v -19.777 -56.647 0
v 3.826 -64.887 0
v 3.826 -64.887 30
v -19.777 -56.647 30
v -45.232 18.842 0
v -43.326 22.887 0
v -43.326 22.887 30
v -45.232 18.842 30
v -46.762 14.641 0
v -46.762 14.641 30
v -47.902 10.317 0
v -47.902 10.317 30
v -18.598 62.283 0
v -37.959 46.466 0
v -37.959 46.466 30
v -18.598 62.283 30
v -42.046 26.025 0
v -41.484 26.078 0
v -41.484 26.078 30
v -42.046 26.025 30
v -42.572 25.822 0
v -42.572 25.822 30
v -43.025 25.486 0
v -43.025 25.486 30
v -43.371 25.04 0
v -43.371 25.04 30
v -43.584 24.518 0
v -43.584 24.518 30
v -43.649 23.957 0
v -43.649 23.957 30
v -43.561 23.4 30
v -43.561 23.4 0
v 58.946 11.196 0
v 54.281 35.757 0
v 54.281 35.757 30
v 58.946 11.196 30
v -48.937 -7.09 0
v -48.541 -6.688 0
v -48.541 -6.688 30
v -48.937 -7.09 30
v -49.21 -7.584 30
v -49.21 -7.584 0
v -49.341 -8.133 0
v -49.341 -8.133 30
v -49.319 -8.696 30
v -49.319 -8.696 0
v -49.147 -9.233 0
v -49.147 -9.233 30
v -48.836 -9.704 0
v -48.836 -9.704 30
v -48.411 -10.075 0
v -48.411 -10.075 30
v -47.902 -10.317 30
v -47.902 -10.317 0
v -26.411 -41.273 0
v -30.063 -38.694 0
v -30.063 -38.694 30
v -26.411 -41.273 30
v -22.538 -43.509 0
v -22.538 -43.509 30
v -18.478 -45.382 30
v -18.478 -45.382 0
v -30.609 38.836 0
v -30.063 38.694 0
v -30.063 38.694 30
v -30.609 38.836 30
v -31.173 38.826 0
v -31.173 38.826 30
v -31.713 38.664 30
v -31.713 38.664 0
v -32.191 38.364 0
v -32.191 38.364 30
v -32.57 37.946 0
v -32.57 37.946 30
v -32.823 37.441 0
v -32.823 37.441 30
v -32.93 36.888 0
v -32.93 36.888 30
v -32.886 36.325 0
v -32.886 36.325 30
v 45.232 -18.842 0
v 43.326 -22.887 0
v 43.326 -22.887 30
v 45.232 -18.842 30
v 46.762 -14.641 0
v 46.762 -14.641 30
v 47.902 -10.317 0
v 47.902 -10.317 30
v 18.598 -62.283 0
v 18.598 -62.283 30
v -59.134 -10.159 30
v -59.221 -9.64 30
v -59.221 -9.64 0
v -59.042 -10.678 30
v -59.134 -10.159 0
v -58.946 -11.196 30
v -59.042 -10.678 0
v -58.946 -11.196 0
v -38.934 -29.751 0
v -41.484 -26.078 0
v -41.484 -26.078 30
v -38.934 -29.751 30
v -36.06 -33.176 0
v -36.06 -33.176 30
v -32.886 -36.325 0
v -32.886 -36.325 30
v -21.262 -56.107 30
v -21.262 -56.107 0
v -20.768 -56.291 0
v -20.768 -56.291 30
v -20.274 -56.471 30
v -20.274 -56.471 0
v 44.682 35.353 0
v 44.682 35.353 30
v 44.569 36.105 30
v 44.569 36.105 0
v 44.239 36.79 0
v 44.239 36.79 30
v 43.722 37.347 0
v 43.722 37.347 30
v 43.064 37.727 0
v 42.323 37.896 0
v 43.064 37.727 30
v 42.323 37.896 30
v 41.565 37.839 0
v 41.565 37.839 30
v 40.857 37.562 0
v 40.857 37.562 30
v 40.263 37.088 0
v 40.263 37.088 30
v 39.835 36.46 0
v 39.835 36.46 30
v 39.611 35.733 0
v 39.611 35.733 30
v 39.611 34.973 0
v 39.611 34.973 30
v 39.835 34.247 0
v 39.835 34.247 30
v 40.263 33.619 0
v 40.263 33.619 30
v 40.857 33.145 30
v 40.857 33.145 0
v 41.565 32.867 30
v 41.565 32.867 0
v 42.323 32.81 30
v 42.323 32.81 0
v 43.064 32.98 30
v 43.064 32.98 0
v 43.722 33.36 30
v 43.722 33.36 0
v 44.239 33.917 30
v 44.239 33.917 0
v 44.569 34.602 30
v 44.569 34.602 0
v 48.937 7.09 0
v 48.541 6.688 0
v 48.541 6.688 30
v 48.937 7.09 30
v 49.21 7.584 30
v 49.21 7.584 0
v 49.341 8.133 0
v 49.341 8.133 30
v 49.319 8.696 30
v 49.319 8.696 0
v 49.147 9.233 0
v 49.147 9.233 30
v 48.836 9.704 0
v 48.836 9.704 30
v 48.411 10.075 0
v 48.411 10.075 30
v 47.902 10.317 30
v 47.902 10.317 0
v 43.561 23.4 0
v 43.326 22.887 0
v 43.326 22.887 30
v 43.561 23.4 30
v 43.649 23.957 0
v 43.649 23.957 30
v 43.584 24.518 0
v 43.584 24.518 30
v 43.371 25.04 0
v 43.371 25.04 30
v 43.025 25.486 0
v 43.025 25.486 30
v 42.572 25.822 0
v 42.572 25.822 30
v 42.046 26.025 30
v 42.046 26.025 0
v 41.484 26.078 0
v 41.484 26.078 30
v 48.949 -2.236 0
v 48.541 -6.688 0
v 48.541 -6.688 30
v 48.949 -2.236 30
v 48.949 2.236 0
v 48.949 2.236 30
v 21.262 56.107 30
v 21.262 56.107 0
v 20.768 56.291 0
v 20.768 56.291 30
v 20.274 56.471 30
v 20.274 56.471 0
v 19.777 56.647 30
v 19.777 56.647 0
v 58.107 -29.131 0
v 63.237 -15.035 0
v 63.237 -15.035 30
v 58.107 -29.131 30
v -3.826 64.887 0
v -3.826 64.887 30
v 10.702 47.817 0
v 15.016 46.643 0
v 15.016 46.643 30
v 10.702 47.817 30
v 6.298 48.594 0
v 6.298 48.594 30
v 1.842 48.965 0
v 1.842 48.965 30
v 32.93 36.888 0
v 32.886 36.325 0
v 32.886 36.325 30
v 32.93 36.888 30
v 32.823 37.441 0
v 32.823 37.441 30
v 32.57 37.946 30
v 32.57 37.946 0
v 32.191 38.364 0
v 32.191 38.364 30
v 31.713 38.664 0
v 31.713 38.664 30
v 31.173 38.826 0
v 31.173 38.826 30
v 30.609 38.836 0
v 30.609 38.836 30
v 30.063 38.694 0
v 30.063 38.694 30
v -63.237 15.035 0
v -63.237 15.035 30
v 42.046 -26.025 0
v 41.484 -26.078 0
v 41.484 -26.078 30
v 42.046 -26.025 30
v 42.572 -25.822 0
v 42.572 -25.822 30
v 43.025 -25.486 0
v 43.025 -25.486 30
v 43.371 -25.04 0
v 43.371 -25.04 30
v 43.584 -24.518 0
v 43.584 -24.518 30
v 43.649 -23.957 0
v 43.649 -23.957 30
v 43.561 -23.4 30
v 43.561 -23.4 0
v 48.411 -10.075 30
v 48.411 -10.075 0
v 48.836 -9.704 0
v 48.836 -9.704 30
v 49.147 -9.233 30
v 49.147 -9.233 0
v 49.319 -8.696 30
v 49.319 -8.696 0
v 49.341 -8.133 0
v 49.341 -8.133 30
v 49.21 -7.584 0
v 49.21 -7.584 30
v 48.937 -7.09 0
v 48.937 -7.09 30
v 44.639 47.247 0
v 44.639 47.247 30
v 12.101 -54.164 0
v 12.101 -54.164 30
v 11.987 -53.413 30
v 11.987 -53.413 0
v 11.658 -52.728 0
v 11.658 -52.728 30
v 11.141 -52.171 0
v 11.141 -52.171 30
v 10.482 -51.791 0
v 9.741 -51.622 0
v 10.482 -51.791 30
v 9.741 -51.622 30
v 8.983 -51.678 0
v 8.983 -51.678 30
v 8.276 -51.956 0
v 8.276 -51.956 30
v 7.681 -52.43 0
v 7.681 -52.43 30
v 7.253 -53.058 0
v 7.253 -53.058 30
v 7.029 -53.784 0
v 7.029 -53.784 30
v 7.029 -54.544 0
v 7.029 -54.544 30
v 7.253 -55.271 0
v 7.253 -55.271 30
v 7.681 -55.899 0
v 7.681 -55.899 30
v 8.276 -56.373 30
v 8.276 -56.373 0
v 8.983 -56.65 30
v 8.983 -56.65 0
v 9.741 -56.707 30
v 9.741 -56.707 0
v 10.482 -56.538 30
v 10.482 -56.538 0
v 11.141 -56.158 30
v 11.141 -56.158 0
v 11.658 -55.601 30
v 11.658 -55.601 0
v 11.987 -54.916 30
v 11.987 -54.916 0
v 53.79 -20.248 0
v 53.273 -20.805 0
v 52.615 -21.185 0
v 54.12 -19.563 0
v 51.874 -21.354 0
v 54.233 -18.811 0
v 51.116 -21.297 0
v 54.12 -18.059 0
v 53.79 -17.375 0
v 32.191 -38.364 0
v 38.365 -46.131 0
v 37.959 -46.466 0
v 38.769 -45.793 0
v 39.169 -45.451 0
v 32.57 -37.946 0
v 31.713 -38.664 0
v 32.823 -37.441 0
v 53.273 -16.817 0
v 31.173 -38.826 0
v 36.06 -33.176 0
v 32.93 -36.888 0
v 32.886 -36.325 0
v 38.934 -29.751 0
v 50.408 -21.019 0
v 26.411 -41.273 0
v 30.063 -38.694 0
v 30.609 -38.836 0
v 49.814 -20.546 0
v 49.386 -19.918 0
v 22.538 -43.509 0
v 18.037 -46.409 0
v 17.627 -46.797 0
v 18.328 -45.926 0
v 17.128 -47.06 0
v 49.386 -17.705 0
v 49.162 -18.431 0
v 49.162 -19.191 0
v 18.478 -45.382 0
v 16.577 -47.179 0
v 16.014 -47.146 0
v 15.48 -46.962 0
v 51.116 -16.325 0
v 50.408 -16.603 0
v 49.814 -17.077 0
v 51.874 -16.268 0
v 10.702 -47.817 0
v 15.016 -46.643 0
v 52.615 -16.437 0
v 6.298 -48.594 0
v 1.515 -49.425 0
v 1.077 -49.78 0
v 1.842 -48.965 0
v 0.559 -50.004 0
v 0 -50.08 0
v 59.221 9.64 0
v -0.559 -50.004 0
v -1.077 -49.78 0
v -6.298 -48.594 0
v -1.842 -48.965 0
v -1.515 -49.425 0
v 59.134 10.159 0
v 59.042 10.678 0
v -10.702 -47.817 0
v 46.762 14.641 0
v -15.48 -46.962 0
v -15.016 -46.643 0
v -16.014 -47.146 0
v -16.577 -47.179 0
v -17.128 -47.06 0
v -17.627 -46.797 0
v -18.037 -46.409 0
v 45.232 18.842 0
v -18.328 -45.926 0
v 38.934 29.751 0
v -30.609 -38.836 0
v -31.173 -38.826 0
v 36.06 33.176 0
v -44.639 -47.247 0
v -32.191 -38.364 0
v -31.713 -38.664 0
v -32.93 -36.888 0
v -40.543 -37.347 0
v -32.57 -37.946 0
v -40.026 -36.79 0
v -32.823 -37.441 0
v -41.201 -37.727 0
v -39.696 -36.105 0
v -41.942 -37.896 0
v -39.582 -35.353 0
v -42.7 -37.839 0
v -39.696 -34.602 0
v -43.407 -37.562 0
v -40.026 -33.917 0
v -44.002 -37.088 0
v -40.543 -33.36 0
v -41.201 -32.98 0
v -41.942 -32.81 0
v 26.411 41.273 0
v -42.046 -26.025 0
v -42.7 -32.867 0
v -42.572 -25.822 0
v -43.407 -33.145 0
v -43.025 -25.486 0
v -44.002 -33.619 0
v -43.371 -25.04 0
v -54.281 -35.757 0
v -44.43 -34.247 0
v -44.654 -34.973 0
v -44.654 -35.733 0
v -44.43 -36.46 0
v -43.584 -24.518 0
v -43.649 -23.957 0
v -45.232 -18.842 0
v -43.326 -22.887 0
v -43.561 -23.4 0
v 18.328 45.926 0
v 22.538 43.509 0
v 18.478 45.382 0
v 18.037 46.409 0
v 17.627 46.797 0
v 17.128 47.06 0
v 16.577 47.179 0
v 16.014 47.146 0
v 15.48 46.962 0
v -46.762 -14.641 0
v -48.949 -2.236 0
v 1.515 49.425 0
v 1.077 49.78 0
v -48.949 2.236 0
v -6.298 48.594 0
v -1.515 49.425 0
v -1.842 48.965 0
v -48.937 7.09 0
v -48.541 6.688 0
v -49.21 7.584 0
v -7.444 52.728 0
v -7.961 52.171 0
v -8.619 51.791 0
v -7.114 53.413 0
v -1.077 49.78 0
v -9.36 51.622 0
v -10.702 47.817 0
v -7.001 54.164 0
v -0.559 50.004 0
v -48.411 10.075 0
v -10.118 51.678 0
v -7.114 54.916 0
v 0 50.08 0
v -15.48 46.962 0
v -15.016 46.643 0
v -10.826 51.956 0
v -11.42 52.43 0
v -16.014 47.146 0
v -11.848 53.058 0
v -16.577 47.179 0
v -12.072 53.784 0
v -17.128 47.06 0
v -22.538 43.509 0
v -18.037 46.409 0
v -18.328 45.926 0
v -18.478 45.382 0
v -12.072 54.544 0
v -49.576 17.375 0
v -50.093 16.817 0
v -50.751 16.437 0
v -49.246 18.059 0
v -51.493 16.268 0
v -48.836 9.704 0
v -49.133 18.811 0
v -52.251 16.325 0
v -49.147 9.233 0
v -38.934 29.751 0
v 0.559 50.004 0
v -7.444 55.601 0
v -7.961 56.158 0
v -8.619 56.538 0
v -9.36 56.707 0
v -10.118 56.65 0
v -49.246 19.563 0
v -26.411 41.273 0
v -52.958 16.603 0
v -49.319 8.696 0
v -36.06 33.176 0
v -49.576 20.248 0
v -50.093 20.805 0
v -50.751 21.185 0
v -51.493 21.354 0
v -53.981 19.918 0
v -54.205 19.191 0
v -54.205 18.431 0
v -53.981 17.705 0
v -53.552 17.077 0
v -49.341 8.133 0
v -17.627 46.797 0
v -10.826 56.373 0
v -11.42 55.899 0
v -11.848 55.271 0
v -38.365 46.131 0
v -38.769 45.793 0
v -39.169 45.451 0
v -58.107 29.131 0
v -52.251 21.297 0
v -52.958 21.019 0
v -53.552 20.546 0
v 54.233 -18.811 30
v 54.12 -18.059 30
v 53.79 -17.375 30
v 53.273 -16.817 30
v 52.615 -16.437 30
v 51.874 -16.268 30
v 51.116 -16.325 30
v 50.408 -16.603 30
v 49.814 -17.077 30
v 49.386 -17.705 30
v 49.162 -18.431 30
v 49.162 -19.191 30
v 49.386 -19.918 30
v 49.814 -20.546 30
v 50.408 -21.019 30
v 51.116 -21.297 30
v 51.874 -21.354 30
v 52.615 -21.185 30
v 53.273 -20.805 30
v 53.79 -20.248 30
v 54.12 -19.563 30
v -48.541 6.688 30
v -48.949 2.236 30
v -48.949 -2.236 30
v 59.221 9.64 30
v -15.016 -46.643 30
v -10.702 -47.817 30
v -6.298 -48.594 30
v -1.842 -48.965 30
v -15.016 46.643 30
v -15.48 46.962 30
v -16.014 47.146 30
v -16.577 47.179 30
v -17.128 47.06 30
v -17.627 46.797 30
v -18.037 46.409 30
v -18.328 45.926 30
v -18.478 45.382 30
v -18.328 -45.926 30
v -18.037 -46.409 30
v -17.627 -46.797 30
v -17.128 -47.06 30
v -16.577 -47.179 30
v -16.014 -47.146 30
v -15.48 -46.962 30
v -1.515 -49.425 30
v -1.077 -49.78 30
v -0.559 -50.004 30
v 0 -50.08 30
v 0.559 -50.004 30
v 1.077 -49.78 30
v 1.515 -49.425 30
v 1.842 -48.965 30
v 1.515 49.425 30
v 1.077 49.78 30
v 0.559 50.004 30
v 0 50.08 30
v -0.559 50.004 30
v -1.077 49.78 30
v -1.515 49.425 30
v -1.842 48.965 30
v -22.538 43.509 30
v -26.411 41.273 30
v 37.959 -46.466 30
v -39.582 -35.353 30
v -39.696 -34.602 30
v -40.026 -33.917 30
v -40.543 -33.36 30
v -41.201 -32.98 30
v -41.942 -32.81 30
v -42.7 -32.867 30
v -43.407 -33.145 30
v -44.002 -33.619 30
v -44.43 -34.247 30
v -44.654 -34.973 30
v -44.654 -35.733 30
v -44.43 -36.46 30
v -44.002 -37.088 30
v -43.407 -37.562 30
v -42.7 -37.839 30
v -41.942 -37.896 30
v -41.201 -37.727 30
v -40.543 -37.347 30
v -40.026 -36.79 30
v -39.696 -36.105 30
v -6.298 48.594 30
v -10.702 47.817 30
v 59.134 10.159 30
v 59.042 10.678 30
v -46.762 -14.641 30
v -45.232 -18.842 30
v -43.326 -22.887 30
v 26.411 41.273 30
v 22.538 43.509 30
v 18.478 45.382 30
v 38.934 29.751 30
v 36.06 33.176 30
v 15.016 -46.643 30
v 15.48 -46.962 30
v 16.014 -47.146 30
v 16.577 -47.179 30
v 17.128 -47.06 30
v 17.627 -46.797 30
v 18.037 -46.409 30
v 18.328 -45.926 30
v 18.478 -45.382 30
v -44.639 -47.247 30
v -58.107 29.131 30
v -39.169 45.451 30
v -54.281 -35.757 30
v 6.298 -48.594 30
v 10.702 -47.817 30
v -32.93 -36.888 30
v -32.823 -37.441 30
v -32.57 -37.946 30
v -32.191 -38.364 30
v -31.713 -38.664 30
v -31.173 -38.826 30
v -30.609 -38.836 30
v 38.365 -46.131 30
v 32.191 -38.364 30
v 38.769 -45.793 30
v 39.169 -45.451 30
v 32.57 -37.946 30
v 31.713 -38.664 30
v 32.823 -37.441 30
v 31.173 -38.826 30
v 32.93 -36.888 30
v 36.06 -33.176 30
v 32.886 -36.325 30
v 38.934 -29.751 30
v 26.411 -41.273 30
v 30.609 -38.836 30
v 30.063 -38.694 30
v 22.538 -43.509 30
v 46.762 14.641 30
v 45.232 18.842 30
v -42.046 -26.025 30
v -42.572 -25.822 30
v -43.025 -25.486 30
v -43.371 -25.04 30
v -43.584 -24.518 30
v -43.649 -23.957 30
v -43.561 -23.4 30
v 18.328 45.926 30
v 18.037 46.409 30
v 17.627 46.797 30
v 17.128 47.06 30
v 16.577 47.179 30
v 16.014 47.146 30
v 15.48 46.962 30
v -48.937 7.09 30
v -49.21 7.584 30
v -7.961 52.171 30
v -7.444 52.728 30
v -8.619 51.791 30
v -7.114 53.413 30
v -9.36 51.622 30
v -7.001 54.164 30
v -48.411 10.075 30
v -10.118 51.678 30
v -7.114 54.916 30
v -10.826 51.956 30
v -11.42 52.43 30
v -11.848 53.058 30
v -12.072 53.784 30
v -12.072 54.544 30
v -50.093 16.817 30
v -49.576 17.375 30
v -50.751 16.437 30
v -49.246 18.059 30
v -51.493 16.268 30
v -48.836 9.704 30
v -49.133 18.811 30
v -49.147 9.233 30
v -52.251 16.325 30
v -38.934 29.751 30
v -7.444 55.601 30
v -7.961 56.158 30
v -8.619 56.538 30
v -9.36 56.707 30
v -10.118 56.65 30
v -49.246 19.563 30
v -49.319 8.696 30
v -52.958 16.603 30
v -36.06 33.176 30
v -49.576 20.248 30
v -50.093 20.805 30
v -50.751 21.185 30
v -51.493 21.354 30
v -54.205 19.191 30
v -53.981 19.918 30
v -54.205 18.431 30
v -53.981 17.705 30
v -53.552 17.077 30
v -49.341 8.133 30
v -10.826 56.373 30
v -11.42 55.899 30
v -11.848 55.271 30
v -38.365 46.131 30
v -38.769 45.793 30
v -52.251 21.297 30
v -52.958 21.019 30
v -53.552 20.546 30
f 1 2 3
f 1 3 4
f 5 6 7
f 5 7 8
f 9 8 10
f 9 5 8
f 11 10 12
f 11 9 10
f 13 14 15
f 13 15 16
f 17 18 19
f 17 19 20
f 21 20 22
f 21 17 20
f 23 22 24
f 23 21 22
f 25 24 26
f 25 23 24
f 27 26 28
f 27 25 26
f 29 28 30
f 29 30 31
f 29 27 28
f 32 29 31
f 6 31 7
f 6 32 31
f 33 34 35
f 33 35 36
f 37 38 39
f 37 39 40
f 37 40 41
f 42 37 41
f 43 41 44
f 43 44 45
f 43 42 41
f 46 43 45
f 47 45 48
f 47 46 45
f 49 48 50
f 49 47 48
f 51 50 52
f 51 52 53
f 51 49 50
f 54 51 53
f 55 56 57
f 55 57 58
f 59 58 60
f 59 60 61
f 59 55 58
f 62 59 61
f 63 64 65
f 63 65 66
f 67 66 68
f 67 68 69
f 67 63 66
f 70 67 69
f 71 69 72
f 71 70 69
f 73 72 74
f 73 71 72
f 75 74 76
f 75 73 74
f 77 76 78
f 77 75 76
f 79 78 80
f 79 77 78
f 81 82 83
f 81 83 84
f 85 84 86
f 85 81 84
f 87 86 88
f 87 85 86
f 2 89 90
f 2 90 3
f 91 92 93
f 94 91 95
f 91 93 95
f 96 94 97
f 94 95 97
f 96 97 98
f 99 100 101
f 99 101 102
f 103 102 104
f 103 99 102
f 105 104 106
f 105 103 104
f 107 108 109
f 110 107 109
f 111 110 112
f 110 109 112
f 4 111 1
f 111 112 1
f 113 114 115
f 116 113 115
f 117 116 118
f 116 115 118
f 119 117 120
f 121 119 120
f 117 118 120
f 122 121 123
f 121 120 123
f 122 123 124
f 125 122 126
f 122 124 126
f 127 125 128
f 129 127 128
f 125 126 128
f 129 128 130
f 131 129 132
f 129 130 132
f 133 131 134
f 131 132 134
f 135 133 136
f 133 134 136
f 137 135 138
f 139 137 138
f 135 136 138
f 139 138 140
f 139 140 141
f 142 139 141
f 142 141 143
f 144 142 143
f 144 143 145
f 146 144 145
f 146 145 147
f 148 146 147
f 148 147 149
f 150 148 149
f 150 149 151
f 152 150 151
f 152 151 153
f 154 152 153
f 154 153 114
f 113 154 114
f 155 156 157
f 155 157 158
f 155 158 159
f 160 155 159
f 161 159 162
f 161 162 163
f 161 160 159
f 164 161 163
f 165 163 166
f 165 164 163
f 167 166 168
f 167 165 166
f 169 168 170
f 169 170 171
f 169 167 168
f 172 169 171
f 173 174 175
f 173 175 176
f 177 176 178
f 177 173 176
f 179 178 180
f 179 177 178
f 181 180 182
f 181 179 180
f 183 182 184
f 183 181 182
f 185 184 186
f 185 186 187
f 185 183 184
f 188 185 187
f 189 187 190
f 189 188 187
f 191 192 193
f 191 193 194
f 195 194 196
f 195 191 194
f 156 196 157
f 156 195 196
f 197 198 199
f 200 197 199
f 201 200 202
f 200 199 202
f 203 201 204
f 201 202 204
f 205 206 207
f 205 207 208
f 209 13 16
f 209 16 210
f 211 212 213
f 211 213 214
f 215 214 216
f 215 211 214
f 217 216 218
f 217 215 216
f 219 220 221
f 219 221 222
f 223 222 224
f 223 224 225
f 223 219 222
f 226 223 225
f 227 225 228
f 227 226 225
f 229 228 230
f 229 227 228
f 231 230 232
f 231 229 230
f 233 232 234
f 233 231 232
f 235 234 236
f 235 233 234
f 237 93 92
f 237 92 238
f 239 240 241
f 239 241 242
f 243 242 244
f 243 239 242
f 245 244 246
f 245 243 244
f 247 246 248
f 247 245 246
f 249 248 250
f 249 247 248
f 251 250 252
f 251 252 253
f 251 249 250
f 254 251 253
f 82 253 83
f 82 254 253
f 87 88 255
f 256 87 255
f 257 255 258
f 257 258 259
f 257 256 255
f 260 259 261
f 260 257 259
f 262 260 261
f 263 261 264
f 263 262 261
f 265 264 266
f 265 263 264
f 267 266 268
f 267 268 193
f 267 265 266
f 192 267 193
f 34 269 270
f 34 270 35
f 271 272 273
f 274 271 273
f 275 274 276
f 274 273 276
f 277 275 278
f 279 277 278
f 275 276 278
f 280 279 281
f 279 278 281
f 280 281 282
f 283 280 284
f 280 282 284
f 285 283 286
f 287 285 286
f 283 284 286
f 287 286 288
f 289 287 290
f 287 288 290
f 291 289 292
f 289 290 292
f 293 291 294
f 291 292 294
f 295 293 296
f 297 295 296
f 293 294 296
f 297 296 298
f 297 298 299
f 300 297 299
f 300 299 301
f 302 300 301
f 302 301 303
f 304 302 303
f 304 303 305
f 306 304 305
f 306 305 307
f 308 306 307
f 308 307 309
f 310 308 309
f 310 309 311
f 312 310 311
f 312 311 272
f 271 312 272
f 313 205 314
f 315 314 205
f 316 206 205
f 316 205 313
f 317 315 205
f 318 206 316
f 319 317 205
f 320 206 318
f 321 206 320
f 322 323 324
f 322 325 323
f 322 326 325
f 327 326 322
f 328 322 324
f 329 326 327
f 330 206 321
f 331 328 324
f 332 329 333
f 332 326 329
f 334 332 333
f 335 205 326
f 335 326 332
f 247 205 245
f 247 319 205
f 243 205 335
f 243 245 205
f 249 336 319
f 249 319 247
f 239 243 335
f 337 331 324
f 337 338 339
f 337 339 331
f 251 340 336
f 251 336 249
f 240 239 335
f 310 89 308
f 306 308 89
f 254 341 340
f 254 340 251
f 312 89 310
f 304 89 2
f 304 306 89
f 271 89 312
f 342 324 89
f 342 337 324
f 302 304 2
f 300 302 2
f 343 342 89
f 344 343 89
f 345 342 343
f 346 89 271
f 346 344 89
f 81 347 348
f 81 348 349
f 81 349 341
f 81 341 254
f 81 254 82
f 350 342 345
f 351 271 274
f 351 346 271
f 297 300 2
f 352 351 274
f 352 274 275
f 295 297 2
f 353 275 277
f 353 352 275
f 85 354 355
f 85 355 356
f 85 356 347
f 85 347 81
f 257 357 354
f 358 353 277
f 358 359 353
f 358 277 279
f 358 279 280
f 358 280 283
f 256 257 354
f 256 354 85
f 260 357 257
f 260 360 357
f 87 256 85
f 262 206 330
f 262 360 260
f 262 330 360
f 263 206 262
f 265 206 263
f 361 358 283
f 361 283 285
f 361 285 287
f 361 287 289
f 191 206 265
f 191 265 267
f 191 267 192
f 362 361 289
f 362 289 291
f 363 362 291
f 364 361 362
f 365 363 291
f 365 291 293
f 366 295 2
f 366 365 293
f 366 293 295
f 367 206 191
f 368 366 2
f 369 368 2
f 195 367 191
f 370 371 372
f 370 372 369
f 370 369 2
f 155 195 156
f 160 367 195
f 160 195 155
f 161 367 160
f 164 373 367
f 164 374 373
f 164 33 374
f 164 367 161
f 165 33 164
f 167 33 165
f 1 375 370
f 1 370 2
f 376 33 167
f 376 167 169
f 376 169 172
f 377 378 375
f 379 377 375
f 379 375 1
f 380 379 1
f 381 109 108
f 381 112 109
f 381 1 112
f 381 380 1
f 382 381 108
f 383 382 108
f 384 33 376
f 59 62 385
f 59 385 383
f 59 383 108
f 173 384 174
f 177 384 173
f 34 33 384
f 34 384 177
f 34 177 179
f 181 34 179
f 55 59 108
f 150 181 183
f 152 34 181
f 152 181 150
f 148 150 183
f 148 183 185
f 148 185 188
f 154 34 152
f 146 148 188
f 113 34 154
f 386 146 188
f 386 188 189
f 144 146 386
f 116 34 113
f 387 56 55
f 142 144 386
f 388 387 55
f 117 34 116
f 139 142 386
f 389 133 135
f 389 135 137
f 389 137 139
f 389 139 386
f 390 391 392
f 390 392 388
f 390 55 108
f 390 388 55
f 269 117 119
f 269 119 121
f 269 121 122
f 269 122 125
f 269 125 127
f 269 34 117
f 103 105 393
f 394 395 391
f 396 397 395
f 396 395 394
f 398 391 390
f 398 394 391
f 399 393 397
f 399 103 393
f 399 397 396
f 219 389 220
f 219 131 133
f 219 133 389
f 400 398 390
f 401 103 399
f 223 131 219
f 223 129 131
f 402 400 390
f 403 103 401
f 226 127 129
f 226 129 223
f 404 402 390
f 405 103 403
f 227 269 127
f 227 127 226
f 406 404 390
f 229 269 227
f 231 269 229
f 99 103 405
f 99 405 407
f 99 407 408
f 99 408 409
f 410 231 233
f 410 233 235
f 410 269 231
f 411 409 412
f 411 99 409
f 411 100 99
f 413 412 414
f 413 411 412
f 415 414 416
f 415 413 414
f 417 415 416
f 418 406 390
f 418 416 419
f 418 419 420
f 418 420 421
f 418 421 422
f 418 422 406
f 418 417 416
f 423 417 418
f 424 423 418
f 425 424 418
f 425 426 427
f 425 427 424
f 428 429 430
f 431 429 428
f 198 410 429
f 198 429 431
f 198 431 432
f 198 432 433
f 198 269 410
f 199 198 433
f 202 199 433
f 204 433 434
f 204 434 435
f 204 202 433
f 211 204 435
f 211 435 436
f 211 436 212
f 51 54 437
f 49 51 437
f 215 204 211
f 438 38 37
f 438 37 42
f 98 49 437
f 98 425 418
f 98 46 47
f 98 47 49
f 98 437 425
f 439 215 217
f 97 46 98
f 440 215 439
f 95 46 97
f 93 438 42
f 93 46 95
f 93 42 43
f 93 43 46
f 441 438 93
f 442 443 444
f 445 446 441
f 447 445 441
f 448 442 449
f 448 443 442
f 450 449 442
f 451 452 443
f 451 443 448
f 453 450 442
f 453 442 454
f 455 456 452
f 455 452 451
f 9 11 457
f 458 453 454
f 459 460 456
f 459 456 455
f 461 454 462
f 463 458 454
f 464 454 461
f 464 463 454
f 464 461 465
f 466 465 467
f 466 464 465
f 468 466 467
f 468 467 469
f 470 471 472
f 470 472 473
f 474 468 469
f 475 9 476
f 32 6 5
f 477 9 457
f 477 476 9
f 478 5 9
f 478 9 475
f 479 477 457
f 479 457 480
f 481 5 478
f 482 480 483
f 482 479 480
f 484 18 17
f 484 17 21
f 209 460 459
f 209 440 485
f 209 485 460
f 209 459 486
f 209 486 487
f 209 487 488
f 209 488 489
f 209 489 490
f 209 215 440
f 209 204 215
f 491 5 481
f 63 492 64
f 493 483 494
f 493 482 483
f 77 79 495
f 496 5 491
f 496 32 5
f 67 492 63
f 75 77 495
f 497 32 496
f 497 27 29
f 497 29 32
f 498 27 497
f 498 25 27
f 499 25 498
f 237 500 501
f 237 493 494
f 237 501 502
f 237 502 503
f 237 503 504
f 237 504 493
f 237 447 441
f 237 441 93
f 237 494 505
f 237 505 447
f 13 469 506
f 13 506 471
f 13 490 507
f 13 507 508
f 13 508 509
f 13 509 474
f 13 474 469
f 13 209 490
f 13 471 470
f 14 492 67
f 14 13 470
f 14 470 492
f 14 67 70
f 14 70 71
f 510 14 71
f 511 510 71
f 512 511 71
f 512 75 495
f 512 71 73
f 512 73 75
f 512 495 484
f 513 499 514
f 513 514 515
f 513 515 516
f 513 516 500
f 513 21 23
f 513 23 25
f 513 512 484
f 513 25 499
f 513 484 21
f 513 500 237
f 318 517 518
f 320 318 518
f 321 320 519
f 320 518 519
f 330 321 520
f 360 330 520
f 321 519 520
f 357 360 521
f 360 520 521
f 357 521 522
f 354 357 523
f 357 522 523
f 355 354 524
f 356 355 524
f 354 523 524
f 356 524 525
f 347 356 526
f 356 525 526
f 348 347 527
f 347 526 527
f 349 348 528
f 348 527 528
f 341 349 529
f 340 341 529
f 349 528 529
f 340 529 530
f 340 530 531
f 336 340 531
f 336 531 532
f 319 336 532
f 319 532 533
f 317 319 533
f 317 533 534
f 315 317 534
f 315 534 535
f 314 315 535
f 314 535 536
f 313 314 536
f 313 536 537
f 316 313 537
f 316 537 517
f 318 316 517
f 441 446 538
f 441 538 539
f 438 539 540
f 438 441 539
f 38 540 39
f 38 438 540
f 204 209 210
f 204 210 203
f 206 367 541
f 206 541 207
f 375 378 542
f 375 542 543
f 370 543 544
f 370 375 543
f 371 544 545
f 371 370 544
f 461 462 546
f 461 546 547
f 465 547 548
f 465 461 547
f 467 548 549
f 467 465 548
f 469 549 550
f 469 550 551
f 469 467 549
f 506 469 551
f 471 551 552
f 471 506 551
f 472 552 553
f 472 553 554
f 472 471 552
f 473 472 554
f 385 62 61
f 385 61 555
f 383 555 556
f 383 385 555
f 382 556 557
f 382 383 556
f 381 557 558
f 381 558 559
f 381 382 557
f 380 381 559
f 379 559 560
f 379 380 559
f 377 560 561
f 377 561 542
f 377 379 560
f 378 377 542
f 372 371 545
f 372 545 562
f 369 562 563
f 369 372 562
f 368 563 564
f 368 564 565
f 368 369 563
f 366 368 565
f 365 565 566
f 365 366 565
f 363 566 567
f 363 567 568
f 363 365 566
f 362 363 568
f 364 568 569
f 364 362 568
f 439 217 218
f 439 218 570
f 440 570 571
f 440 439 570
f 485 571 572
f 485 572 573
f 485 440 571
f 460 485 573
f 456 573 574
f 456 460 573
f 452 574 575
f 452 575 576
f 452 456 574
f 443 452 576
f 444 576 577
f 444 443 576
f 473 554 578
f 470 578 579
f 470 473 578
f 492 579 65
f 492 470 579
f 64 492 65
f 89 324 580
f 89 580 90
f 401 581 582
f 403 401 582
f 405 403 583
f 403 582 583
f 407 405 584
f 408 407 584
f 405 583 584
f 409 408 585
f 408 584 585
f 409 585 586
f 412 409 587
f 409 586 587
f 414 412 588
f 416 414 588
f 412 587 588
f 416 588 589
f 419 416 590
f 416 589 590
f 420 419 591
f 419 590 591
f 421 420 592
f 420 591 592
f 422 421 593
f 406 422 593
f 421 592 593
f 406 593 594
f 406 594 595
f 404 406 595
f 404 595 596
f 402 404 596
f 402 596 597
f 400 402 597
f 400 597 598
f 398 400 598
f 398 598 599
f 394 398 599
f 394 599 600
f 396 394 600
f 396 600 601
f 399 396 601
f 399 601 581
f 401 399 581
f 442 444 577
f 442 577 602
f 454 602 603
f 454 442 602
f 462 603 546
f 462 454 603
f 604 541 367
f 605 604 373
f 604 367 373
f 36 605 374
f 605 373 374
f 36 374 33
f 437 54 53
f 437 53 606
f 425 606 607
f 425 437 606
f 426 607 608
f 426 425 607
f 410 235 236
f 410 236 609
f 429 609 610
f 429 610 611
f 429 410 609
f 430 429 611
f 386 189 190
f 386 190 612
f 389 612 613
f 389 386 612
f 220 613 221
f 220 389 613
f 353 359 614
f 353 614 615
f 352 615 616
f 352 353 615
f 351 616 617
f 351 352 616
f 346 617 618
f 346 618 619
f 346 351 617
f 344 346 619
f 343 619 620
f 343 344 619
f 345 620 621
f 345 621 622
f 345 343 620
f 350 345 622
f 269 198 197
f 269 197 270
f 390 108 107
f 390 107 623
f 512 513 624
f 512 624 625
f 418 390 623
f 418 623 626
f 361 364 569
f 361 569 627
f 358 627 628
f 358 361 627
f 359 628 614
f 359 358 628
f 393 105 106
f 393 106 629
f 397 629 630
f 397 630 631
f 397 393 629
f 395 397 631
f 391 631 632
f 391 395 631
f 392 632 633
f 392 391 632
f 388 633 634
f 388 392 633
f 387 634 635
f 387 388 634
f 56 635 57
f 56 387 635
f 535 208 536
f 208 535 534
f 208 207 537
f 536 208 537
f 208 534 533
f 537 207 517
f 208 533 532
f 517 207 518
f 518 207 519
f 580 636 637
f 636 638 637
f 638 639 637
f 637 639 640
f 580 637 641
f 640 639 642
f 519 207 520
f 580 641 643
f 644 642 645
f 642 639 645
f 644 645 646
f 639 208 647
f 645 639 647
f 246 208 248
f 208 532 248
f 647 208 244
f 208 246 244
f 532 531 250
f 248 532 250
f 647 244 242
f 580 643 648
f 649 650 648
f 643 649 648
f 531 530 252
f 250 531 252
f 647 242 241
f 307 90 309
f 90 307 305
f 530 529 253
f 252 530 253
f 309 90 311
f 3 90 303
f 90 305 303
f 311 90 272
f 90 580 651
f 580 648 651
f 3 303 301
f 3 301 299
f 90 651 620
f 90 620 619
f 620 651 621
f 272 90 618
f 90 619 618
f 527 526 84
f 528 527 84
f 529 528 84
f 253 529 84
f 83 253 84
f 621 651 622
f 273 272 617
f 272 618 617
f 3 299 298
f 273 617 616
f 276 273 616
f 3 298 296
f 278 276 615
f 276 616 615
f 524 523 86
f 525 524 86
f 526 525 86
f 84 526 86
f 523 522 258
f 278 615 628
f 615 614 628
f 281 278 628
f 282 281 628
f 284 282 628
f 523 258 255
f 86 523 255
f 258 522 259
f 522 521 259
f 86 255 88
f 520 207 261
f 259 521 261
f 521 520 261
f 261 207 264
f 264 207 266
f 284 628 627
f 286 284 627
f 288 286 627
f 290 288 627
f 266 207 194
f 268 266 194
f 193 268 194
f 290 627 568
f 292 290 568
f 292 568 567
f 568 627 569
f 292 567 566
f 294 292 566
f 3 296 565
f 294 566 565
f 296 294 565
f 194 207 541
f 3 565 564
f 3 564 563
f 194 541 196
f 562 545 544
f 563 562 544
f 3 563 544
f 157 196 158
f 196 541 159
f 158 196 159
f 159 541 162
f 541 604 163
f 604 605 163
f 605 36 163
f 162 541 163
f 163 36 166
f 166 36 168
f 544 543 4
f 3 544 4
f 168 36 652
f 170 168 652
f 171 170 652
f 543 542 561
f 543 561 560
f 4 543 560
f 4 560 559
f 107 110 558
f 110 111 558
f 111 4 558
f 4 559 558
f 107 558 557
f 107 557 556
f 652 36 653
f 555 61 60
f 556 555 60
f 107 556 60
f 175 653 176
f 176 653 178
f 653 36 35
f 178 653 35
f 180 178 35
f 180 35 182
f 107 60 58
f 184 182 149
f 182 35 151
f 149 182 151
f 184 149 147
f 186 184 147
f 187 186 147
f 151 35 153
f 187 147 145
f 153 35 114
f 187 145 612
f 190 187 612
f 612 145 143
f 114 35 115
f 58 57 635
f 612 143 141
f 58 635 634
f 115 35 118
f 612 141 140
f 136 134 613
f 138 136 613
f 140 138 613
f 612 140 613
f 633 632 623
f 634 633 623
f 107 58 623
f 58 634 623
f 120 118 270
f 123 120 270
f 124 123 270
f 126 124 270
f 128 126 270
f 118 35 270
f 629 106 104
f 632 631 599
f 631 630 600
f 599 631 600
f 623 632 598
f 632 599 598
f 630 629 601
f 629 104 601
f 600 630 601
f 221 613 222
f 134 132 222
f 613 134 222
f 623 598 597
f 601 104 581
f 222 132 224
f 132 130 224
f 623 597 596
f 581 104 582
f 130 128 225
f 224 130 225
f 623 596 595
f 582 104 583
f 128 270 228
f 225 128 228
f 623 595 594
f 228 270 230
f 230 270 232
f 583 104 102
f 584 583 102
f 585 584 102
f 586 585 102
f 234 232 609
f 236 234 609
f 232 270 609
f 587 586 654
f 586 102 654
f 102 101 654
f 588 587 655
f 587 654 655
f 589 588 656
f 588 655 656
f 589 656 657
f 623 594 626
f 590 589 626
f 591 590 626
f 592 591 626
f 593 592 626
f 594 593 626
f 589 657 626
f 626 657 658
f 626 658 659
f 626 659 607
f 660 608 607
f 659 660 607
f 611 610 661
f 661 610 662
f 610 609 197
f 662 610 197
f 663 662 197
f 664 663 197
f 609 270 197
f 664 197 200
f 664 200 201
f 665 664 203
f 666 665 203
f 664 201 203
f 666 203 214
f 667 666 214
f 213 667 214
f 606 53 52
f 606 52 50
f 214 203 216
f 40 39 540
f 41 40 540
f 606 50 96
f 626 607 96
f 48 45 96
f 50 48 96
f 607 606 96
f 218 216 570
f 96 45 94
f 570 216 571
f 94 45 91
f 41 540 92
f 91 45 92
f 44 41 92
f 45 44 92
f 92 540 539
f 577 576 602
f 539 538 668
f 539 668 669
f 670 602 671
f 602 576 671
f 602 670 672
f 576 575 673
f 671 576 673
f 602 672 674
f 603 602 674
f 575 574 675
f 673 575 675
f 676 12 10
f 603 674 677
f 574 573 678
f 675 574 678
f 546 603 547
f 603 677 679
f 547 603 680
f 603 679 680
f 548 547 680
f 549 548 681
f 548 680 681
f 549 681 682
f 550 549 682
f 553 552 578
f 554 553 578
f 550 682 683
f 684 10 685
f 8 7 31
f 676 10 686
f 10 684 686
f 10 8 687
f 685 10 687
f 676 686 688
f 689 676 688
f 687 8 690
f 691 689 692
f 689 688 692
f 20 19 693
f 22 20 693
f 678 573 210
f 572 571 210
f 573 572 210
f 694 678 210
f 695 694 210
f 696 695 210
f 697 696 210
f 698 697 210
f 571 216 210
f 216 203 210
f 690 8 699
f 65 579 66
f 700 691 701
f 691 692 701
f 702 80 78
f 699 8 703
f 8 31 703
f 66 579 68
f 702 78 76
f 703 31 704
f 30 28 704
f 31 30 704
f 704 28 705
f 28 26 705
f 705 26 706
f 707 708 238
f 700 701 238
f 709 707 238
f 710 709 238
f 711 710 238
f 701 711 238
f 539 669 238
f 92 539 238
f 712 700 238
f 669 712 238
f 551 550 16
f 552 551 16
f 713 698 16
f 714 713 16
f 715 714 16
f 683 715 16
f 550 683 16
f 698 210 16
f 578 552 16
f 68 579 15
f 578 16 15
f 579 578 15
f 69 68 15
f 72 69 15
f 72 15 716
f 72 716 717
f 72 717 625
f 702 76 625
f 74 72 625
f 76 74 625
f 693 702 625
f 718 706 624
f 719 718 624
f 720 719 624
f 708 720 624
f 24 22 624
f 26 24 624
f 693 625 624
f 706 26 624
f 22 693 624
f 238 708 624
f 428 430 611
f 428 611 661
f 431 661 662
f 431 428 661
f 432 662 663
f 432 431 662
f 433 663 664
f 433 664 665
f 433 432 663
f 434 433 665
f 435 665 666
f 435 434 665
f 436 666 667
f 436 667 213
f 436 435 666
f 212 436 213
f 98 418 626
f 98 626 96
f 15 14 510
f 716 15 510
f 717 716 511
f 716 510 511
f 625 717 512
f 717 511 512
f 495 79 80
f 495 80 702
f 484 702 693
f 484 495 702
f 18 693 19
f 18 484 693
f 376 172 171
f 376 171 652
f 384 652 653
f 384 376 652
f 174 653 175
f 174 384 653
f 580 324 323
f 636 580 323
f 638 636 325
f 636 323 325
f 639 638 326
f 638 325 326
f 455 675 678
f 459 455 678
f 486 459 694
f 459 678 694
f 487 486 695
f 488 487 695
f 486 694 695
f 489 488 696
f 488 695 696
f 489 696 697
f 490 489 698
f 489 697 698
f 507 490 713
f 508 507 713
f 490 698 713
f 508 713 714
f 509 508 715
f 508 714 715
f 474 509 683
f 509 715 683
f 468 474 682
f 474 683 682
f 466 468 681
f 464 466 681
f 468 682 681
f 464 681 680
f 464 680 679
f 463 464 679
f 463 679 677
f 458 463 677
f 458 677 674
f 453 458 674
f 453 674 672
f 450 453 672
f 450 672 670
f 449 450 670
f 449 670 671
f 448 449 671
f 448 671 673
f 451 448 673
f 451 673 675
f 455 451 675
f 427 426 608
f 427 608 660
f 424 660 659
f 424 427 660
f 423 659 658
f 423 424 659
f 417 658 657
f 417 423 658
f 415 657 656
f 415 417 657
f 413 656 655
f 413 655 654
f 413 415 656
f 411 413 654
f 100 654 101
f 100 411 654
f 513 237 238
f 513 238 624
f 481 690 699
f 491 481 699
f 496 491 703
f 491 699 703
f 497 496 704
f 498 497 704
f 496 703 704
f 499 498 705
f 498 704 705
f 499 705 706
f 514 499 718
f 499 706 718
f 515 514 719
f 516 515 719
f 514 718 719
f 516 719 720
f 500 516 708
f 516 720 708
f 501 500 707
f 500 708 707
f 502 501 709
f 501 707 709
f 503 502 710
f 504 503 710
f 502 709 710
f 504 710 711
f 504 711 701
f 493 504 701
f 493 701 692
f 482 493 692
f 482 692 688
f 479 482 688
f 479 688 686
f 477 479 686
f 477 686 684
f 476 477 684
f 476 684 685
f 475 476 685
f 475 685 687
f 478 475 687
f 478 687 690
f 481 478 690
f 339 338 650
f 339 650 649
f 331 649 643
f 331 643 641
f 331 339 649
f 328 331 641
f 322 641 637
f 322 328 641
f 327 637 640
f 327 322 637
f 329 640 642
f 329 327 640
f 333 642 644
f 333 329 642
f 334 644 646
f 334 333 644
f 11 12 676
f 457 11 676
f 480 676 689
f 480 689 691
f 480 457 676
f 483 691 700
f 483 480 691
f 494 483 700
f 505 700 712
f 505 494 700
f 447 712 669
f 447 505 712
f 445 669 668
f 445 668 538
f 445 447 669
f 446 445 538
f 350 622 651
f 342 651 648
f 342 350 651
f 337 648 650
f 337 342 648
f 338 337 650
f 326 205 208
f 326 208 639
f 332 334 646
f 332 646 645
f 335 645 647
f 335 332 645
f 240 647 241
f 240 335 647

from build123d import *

# Parameters (mm, degrees)
SKETCH1_R           = 60
BOSS_EXTRUDE1_DEPTH = 30
SKETCH2_R           = 2.55
CUT_EXTRUDE2_DEPTH  = 91
BOSS_EXTRUDE2_START = -30
BOSS_EXTRUDE2_DEPTH = 30


with BuildPart() as part:
    # Sketch1 → Boss-Extrude1 (new body)
    with BuildSketch(Plane.XY):
        Circle(SKETCH1_R)
        with BuildLine():
            ThreePointArc((-15.015830627, 46.642521701), (-17.128368778, 47.059806449), (-18.478441423, 45.382234438))
            ThreePointArc((-18.478441423, 45.382234438), (-24.5, 42.435244785), (-30.062947192, 38.693916914))
            ThreePointArc((-30.062947192, 38.693916914), (-32.190803493, 38.363505711), (-32.885693376, 36.325351632))
            ThreePointArc((-32.885693376, 36.325351632), (-37.536177713, 31.496592875), (-41.484028644, 26.078254686))
            ThreePointArc((-41.484028644, 26.078254686), (-43.370552222, 25.04), (-43.326445366, 22.887095314))
            ThreePointArc((-43.326445366, 22.887095314), (-46.044938419, 16.758987023), (-47.901524003, 10.317170068))
            ThreePointArc((-47.901524003, 10.317170068), (-49.319172271, 8.696300738), (-48.541388615, 6.688317524))
            ThreePointArc((-48.541388615, 6.688317524), (-49, 0), (-48.541388615, -6.688317524))
            ThreePointArc((-48.541388615, -6.688317524), (-49.319172271, -8.696300738), (-47.901524003, -10.317170068))
            ThreePointArc((-47.901524003, -10.317170068), (-46.044938419, -16.758987023), (-43.326445366, -22.887095314))
            ThreePointArc((-43.326445366, -22.887095314), (-43.370552222, -25.04), (-41.484028644, -26.078254686))
            ThreePointArc((-41.484028644, -26.078254686), (-37.536177713, -31.496592875), (-32.885693376, -36.325351632))
            ThreePointArc((-32.885693376, -36.325351632), (-32.190803493, -38.363505711), (-30.062947192, -38.693916914))
            ThreePointArc((-30.062947192, -38.693916914), (-24.5, -42.435244785), (-18.478441423, -45.382234438))
            ThreePointArc((-18.478441423, -45.382234438), (-17.128368778, -47.059806449), (-15.015830627, -46.642521701))
            ThreePointArc((-15.015830627, -46.642521701), (-8.508760706, -48.255579898), (-1.842416722, -48.96535))
            ThreePointArc((-1.842416722, -48.96535), (0, -50.08), (1.842416722, -48.96535))
            ThreePointArc((1.842416722, -48.96535), (8.508760706, -48.255579898), (15.015830627, -46.642521701))
            ThreePointArc((15.015830627, -46.642521701), (17.128368778, -47.059806449), (18.478441423, -45.382234438))
            ThreePointArc((18.478441423, -45.382234438), (24.5, -42.435244785), (30.062947192, -38.693916914))
            ThreePointArc((30.062947192, -38.693916914), (32.190803493, -38.363505711), (32.885693376, -36.325351632))
            ThreePointArc((32.885693376, -36.325351632), (37.536177713, -31.496592875), (41.484028644, -26.078254686))
            ThreePointArc((41.484028644, -26.078254686), (43.370552222, -25.04), (43.326445366, -22.887095314))
            ThreePointArc((43.326445366, -22.887095314), (46.044938419, -16.758987023), (47.901524003, -10.317170068))
            ThreePointArc((47.901524003, -10.317170068), (49.319172271, -8.696300738), (48.541388615, -6.688317524))
            ThreePointArc((48.541388615, -6.688317524), (49, 0), (48.541388615, 6.688317524))
            ThreePointArc((48.541388615, 6.688317524), (49.319172271, 8.696300738), (47.901524003, 10.317170068))
            ThreePointArc((47.901524003, 10.317170068), (46.044938419, 16.758987023), (43.326445366, 22.887095314))
            ThreePointArc((43.326445366, 22.887095314), (43.370552222, 25.04), (41.484028644, 26.078254686))
            ThreePointArc((41.484028644, 26.078254686), (37.536177713, 31.496592875), (32.885693376, 36.325351632))
            ThreePointArc((32.885693376, 36.325351632), (32.190803493, 38.363505711), (30.062947192, 38.693916914))
            ThreePointArc((30.062947192, 38.693916914), (24.5, 42.435244785), (18.478441423, 45.382234438))
            ThreePointArc((18.478441423, 45.382234438), (17.128368778, 47.059806449), (15.015830627, 46.642521701))
            ThreePointArc((15.015830627, 46.642521701), (8.508760706, 48.255579898), (1.842416722, 48.96535))
            ThreePointArc((1.842416722, 48.96535), (0, 50.08), (-1.842416722, 48.96535))
            ThreePointArc((-1.842416722, 48.96535), (-8.508760706, 48.255579898), (-15.015830627, 46.642521701))
        make_face(mode=Mode.SUBTRACT)
    extrude(amount=BOSS_EXTRUDE1_DEPTH)

    # Sketch2 → Cut-Extrude2 (cut, through all)
    with BuildSketch(Plane.XY.offset(30)):
        with Locations((-9.550649772, 54.164426416)):
            Circle(SKETCH2_R)
        with Locations((42.132444372, 35.353318533)):
            Circle(SKETCH2_R)
        with Locations((51.683094143, -18.811107883)):
            Circle(SKETCH2_R)
        with Locations((9.550649772, -54.164426416)):
            Circle(SKETCH2_R)
        with Locations((-42.132444372, -35.353318533)):
            Circle(SKETCH2_R)
        with Locations((-51.683094143, 18.811107883)):
            Circle(SKETCH2_R)
    extrude(amount=-CUT_EXTRUDE2_DEPTH, mode=Mode.SUBTRACT)

    # Sketch3 → Boss-Extrude2 (add)
    with BuildSketch(Plane.XY.offset(30).offset(BOSS_EXTRUDE2_START)):
        with BuildLine():
            Line((-37.958811886, 46.46642444), (-18.597801703, 62.282596059))
            Line((-18.597801703, 62.282596059), (-3.825685408, 64.887318724))
            Line((-3.825685408, 64.887318724), (19.777162276, 56.646834442))
            ThreePointArc((19.777162276, 56.646834442), (-10.41889066, 59.088465181), (-37.958811886, 46.46642444))
        make_face()
        with BuildLine():
            Line((54.281223694, 35.756800112), (58.946178809, 11.195892275))
            ThreePointArc((58.946178809, 11.195892275), (45.962666587, 38.567256581), (21.261698045, 56.106507611))
            Line((21.261698045, 56.106507611), (44.639409549, 47.247466759))
            Line((44.639409549, 47.247466759), (54.281223694, 35.756800112))
        make_face()
        with BuildLine():
            Line((58.106909102, -29.130518612), (39.169016532, -45.450942167))
            ThreePointArc((39.169016532, -45.450942167), (56.381557247, -20.5212086), (59.220509931, 9.640083171))
            Line((59.220509931, 9.640083171), (63.237211252, -15.0351293))
            Line((63.237211252, -15.0351293), (58.106909102, -29.130518612))
        make_face()
        with BuildLine():
            Line((3.825685408, -64.887318724), (-19.777162276, -56.646834442))
            ThreePointArc((-19.777162276, -56.646834442), (10.41889066, -59.088465181), (37.958811886, -46.46642444))
            Line((37.958811886, -46.46642444), (18.597801703, -62.282596059))
            Line((18.597801703, -62.282596059), (3.825685408, -64.887318724))
        make_face()
        with BuildLine():
            Line((-54.281223694, -35.756800112), (-58.946178809, -11.195892275))
            ThreePointArc((-58.946178809, -11.195892275), (-45.962666587, -38.567256581), (-21.261698045, -56.106507611))
            Line((-21.261698045, -56.106507611), (-44.639409549, -47.247466759))
            Line((-44.639409549, -47.247466759), (-54.281223694, -35.756800112))
        make_face()
        with BuildLine():
            Line((-58.106909102, 29.130518612), (-39.169016532, 45.450942167))
            ThreePointArc((-39.169016532, 45.450942167), (-56.381557247, 20.5212086), (-59.220509931, -9.640083171))
            Line((-59.220509931, -9.640083171), (-63.237211252, 15.0351293))
            Line((-63.237211252, 15.0351293), (-58.106909102, 29.130518612))
        make_face()
    extrude(amount=BOSS_EXTRUDE2_DEPTH)


solid = part.part
